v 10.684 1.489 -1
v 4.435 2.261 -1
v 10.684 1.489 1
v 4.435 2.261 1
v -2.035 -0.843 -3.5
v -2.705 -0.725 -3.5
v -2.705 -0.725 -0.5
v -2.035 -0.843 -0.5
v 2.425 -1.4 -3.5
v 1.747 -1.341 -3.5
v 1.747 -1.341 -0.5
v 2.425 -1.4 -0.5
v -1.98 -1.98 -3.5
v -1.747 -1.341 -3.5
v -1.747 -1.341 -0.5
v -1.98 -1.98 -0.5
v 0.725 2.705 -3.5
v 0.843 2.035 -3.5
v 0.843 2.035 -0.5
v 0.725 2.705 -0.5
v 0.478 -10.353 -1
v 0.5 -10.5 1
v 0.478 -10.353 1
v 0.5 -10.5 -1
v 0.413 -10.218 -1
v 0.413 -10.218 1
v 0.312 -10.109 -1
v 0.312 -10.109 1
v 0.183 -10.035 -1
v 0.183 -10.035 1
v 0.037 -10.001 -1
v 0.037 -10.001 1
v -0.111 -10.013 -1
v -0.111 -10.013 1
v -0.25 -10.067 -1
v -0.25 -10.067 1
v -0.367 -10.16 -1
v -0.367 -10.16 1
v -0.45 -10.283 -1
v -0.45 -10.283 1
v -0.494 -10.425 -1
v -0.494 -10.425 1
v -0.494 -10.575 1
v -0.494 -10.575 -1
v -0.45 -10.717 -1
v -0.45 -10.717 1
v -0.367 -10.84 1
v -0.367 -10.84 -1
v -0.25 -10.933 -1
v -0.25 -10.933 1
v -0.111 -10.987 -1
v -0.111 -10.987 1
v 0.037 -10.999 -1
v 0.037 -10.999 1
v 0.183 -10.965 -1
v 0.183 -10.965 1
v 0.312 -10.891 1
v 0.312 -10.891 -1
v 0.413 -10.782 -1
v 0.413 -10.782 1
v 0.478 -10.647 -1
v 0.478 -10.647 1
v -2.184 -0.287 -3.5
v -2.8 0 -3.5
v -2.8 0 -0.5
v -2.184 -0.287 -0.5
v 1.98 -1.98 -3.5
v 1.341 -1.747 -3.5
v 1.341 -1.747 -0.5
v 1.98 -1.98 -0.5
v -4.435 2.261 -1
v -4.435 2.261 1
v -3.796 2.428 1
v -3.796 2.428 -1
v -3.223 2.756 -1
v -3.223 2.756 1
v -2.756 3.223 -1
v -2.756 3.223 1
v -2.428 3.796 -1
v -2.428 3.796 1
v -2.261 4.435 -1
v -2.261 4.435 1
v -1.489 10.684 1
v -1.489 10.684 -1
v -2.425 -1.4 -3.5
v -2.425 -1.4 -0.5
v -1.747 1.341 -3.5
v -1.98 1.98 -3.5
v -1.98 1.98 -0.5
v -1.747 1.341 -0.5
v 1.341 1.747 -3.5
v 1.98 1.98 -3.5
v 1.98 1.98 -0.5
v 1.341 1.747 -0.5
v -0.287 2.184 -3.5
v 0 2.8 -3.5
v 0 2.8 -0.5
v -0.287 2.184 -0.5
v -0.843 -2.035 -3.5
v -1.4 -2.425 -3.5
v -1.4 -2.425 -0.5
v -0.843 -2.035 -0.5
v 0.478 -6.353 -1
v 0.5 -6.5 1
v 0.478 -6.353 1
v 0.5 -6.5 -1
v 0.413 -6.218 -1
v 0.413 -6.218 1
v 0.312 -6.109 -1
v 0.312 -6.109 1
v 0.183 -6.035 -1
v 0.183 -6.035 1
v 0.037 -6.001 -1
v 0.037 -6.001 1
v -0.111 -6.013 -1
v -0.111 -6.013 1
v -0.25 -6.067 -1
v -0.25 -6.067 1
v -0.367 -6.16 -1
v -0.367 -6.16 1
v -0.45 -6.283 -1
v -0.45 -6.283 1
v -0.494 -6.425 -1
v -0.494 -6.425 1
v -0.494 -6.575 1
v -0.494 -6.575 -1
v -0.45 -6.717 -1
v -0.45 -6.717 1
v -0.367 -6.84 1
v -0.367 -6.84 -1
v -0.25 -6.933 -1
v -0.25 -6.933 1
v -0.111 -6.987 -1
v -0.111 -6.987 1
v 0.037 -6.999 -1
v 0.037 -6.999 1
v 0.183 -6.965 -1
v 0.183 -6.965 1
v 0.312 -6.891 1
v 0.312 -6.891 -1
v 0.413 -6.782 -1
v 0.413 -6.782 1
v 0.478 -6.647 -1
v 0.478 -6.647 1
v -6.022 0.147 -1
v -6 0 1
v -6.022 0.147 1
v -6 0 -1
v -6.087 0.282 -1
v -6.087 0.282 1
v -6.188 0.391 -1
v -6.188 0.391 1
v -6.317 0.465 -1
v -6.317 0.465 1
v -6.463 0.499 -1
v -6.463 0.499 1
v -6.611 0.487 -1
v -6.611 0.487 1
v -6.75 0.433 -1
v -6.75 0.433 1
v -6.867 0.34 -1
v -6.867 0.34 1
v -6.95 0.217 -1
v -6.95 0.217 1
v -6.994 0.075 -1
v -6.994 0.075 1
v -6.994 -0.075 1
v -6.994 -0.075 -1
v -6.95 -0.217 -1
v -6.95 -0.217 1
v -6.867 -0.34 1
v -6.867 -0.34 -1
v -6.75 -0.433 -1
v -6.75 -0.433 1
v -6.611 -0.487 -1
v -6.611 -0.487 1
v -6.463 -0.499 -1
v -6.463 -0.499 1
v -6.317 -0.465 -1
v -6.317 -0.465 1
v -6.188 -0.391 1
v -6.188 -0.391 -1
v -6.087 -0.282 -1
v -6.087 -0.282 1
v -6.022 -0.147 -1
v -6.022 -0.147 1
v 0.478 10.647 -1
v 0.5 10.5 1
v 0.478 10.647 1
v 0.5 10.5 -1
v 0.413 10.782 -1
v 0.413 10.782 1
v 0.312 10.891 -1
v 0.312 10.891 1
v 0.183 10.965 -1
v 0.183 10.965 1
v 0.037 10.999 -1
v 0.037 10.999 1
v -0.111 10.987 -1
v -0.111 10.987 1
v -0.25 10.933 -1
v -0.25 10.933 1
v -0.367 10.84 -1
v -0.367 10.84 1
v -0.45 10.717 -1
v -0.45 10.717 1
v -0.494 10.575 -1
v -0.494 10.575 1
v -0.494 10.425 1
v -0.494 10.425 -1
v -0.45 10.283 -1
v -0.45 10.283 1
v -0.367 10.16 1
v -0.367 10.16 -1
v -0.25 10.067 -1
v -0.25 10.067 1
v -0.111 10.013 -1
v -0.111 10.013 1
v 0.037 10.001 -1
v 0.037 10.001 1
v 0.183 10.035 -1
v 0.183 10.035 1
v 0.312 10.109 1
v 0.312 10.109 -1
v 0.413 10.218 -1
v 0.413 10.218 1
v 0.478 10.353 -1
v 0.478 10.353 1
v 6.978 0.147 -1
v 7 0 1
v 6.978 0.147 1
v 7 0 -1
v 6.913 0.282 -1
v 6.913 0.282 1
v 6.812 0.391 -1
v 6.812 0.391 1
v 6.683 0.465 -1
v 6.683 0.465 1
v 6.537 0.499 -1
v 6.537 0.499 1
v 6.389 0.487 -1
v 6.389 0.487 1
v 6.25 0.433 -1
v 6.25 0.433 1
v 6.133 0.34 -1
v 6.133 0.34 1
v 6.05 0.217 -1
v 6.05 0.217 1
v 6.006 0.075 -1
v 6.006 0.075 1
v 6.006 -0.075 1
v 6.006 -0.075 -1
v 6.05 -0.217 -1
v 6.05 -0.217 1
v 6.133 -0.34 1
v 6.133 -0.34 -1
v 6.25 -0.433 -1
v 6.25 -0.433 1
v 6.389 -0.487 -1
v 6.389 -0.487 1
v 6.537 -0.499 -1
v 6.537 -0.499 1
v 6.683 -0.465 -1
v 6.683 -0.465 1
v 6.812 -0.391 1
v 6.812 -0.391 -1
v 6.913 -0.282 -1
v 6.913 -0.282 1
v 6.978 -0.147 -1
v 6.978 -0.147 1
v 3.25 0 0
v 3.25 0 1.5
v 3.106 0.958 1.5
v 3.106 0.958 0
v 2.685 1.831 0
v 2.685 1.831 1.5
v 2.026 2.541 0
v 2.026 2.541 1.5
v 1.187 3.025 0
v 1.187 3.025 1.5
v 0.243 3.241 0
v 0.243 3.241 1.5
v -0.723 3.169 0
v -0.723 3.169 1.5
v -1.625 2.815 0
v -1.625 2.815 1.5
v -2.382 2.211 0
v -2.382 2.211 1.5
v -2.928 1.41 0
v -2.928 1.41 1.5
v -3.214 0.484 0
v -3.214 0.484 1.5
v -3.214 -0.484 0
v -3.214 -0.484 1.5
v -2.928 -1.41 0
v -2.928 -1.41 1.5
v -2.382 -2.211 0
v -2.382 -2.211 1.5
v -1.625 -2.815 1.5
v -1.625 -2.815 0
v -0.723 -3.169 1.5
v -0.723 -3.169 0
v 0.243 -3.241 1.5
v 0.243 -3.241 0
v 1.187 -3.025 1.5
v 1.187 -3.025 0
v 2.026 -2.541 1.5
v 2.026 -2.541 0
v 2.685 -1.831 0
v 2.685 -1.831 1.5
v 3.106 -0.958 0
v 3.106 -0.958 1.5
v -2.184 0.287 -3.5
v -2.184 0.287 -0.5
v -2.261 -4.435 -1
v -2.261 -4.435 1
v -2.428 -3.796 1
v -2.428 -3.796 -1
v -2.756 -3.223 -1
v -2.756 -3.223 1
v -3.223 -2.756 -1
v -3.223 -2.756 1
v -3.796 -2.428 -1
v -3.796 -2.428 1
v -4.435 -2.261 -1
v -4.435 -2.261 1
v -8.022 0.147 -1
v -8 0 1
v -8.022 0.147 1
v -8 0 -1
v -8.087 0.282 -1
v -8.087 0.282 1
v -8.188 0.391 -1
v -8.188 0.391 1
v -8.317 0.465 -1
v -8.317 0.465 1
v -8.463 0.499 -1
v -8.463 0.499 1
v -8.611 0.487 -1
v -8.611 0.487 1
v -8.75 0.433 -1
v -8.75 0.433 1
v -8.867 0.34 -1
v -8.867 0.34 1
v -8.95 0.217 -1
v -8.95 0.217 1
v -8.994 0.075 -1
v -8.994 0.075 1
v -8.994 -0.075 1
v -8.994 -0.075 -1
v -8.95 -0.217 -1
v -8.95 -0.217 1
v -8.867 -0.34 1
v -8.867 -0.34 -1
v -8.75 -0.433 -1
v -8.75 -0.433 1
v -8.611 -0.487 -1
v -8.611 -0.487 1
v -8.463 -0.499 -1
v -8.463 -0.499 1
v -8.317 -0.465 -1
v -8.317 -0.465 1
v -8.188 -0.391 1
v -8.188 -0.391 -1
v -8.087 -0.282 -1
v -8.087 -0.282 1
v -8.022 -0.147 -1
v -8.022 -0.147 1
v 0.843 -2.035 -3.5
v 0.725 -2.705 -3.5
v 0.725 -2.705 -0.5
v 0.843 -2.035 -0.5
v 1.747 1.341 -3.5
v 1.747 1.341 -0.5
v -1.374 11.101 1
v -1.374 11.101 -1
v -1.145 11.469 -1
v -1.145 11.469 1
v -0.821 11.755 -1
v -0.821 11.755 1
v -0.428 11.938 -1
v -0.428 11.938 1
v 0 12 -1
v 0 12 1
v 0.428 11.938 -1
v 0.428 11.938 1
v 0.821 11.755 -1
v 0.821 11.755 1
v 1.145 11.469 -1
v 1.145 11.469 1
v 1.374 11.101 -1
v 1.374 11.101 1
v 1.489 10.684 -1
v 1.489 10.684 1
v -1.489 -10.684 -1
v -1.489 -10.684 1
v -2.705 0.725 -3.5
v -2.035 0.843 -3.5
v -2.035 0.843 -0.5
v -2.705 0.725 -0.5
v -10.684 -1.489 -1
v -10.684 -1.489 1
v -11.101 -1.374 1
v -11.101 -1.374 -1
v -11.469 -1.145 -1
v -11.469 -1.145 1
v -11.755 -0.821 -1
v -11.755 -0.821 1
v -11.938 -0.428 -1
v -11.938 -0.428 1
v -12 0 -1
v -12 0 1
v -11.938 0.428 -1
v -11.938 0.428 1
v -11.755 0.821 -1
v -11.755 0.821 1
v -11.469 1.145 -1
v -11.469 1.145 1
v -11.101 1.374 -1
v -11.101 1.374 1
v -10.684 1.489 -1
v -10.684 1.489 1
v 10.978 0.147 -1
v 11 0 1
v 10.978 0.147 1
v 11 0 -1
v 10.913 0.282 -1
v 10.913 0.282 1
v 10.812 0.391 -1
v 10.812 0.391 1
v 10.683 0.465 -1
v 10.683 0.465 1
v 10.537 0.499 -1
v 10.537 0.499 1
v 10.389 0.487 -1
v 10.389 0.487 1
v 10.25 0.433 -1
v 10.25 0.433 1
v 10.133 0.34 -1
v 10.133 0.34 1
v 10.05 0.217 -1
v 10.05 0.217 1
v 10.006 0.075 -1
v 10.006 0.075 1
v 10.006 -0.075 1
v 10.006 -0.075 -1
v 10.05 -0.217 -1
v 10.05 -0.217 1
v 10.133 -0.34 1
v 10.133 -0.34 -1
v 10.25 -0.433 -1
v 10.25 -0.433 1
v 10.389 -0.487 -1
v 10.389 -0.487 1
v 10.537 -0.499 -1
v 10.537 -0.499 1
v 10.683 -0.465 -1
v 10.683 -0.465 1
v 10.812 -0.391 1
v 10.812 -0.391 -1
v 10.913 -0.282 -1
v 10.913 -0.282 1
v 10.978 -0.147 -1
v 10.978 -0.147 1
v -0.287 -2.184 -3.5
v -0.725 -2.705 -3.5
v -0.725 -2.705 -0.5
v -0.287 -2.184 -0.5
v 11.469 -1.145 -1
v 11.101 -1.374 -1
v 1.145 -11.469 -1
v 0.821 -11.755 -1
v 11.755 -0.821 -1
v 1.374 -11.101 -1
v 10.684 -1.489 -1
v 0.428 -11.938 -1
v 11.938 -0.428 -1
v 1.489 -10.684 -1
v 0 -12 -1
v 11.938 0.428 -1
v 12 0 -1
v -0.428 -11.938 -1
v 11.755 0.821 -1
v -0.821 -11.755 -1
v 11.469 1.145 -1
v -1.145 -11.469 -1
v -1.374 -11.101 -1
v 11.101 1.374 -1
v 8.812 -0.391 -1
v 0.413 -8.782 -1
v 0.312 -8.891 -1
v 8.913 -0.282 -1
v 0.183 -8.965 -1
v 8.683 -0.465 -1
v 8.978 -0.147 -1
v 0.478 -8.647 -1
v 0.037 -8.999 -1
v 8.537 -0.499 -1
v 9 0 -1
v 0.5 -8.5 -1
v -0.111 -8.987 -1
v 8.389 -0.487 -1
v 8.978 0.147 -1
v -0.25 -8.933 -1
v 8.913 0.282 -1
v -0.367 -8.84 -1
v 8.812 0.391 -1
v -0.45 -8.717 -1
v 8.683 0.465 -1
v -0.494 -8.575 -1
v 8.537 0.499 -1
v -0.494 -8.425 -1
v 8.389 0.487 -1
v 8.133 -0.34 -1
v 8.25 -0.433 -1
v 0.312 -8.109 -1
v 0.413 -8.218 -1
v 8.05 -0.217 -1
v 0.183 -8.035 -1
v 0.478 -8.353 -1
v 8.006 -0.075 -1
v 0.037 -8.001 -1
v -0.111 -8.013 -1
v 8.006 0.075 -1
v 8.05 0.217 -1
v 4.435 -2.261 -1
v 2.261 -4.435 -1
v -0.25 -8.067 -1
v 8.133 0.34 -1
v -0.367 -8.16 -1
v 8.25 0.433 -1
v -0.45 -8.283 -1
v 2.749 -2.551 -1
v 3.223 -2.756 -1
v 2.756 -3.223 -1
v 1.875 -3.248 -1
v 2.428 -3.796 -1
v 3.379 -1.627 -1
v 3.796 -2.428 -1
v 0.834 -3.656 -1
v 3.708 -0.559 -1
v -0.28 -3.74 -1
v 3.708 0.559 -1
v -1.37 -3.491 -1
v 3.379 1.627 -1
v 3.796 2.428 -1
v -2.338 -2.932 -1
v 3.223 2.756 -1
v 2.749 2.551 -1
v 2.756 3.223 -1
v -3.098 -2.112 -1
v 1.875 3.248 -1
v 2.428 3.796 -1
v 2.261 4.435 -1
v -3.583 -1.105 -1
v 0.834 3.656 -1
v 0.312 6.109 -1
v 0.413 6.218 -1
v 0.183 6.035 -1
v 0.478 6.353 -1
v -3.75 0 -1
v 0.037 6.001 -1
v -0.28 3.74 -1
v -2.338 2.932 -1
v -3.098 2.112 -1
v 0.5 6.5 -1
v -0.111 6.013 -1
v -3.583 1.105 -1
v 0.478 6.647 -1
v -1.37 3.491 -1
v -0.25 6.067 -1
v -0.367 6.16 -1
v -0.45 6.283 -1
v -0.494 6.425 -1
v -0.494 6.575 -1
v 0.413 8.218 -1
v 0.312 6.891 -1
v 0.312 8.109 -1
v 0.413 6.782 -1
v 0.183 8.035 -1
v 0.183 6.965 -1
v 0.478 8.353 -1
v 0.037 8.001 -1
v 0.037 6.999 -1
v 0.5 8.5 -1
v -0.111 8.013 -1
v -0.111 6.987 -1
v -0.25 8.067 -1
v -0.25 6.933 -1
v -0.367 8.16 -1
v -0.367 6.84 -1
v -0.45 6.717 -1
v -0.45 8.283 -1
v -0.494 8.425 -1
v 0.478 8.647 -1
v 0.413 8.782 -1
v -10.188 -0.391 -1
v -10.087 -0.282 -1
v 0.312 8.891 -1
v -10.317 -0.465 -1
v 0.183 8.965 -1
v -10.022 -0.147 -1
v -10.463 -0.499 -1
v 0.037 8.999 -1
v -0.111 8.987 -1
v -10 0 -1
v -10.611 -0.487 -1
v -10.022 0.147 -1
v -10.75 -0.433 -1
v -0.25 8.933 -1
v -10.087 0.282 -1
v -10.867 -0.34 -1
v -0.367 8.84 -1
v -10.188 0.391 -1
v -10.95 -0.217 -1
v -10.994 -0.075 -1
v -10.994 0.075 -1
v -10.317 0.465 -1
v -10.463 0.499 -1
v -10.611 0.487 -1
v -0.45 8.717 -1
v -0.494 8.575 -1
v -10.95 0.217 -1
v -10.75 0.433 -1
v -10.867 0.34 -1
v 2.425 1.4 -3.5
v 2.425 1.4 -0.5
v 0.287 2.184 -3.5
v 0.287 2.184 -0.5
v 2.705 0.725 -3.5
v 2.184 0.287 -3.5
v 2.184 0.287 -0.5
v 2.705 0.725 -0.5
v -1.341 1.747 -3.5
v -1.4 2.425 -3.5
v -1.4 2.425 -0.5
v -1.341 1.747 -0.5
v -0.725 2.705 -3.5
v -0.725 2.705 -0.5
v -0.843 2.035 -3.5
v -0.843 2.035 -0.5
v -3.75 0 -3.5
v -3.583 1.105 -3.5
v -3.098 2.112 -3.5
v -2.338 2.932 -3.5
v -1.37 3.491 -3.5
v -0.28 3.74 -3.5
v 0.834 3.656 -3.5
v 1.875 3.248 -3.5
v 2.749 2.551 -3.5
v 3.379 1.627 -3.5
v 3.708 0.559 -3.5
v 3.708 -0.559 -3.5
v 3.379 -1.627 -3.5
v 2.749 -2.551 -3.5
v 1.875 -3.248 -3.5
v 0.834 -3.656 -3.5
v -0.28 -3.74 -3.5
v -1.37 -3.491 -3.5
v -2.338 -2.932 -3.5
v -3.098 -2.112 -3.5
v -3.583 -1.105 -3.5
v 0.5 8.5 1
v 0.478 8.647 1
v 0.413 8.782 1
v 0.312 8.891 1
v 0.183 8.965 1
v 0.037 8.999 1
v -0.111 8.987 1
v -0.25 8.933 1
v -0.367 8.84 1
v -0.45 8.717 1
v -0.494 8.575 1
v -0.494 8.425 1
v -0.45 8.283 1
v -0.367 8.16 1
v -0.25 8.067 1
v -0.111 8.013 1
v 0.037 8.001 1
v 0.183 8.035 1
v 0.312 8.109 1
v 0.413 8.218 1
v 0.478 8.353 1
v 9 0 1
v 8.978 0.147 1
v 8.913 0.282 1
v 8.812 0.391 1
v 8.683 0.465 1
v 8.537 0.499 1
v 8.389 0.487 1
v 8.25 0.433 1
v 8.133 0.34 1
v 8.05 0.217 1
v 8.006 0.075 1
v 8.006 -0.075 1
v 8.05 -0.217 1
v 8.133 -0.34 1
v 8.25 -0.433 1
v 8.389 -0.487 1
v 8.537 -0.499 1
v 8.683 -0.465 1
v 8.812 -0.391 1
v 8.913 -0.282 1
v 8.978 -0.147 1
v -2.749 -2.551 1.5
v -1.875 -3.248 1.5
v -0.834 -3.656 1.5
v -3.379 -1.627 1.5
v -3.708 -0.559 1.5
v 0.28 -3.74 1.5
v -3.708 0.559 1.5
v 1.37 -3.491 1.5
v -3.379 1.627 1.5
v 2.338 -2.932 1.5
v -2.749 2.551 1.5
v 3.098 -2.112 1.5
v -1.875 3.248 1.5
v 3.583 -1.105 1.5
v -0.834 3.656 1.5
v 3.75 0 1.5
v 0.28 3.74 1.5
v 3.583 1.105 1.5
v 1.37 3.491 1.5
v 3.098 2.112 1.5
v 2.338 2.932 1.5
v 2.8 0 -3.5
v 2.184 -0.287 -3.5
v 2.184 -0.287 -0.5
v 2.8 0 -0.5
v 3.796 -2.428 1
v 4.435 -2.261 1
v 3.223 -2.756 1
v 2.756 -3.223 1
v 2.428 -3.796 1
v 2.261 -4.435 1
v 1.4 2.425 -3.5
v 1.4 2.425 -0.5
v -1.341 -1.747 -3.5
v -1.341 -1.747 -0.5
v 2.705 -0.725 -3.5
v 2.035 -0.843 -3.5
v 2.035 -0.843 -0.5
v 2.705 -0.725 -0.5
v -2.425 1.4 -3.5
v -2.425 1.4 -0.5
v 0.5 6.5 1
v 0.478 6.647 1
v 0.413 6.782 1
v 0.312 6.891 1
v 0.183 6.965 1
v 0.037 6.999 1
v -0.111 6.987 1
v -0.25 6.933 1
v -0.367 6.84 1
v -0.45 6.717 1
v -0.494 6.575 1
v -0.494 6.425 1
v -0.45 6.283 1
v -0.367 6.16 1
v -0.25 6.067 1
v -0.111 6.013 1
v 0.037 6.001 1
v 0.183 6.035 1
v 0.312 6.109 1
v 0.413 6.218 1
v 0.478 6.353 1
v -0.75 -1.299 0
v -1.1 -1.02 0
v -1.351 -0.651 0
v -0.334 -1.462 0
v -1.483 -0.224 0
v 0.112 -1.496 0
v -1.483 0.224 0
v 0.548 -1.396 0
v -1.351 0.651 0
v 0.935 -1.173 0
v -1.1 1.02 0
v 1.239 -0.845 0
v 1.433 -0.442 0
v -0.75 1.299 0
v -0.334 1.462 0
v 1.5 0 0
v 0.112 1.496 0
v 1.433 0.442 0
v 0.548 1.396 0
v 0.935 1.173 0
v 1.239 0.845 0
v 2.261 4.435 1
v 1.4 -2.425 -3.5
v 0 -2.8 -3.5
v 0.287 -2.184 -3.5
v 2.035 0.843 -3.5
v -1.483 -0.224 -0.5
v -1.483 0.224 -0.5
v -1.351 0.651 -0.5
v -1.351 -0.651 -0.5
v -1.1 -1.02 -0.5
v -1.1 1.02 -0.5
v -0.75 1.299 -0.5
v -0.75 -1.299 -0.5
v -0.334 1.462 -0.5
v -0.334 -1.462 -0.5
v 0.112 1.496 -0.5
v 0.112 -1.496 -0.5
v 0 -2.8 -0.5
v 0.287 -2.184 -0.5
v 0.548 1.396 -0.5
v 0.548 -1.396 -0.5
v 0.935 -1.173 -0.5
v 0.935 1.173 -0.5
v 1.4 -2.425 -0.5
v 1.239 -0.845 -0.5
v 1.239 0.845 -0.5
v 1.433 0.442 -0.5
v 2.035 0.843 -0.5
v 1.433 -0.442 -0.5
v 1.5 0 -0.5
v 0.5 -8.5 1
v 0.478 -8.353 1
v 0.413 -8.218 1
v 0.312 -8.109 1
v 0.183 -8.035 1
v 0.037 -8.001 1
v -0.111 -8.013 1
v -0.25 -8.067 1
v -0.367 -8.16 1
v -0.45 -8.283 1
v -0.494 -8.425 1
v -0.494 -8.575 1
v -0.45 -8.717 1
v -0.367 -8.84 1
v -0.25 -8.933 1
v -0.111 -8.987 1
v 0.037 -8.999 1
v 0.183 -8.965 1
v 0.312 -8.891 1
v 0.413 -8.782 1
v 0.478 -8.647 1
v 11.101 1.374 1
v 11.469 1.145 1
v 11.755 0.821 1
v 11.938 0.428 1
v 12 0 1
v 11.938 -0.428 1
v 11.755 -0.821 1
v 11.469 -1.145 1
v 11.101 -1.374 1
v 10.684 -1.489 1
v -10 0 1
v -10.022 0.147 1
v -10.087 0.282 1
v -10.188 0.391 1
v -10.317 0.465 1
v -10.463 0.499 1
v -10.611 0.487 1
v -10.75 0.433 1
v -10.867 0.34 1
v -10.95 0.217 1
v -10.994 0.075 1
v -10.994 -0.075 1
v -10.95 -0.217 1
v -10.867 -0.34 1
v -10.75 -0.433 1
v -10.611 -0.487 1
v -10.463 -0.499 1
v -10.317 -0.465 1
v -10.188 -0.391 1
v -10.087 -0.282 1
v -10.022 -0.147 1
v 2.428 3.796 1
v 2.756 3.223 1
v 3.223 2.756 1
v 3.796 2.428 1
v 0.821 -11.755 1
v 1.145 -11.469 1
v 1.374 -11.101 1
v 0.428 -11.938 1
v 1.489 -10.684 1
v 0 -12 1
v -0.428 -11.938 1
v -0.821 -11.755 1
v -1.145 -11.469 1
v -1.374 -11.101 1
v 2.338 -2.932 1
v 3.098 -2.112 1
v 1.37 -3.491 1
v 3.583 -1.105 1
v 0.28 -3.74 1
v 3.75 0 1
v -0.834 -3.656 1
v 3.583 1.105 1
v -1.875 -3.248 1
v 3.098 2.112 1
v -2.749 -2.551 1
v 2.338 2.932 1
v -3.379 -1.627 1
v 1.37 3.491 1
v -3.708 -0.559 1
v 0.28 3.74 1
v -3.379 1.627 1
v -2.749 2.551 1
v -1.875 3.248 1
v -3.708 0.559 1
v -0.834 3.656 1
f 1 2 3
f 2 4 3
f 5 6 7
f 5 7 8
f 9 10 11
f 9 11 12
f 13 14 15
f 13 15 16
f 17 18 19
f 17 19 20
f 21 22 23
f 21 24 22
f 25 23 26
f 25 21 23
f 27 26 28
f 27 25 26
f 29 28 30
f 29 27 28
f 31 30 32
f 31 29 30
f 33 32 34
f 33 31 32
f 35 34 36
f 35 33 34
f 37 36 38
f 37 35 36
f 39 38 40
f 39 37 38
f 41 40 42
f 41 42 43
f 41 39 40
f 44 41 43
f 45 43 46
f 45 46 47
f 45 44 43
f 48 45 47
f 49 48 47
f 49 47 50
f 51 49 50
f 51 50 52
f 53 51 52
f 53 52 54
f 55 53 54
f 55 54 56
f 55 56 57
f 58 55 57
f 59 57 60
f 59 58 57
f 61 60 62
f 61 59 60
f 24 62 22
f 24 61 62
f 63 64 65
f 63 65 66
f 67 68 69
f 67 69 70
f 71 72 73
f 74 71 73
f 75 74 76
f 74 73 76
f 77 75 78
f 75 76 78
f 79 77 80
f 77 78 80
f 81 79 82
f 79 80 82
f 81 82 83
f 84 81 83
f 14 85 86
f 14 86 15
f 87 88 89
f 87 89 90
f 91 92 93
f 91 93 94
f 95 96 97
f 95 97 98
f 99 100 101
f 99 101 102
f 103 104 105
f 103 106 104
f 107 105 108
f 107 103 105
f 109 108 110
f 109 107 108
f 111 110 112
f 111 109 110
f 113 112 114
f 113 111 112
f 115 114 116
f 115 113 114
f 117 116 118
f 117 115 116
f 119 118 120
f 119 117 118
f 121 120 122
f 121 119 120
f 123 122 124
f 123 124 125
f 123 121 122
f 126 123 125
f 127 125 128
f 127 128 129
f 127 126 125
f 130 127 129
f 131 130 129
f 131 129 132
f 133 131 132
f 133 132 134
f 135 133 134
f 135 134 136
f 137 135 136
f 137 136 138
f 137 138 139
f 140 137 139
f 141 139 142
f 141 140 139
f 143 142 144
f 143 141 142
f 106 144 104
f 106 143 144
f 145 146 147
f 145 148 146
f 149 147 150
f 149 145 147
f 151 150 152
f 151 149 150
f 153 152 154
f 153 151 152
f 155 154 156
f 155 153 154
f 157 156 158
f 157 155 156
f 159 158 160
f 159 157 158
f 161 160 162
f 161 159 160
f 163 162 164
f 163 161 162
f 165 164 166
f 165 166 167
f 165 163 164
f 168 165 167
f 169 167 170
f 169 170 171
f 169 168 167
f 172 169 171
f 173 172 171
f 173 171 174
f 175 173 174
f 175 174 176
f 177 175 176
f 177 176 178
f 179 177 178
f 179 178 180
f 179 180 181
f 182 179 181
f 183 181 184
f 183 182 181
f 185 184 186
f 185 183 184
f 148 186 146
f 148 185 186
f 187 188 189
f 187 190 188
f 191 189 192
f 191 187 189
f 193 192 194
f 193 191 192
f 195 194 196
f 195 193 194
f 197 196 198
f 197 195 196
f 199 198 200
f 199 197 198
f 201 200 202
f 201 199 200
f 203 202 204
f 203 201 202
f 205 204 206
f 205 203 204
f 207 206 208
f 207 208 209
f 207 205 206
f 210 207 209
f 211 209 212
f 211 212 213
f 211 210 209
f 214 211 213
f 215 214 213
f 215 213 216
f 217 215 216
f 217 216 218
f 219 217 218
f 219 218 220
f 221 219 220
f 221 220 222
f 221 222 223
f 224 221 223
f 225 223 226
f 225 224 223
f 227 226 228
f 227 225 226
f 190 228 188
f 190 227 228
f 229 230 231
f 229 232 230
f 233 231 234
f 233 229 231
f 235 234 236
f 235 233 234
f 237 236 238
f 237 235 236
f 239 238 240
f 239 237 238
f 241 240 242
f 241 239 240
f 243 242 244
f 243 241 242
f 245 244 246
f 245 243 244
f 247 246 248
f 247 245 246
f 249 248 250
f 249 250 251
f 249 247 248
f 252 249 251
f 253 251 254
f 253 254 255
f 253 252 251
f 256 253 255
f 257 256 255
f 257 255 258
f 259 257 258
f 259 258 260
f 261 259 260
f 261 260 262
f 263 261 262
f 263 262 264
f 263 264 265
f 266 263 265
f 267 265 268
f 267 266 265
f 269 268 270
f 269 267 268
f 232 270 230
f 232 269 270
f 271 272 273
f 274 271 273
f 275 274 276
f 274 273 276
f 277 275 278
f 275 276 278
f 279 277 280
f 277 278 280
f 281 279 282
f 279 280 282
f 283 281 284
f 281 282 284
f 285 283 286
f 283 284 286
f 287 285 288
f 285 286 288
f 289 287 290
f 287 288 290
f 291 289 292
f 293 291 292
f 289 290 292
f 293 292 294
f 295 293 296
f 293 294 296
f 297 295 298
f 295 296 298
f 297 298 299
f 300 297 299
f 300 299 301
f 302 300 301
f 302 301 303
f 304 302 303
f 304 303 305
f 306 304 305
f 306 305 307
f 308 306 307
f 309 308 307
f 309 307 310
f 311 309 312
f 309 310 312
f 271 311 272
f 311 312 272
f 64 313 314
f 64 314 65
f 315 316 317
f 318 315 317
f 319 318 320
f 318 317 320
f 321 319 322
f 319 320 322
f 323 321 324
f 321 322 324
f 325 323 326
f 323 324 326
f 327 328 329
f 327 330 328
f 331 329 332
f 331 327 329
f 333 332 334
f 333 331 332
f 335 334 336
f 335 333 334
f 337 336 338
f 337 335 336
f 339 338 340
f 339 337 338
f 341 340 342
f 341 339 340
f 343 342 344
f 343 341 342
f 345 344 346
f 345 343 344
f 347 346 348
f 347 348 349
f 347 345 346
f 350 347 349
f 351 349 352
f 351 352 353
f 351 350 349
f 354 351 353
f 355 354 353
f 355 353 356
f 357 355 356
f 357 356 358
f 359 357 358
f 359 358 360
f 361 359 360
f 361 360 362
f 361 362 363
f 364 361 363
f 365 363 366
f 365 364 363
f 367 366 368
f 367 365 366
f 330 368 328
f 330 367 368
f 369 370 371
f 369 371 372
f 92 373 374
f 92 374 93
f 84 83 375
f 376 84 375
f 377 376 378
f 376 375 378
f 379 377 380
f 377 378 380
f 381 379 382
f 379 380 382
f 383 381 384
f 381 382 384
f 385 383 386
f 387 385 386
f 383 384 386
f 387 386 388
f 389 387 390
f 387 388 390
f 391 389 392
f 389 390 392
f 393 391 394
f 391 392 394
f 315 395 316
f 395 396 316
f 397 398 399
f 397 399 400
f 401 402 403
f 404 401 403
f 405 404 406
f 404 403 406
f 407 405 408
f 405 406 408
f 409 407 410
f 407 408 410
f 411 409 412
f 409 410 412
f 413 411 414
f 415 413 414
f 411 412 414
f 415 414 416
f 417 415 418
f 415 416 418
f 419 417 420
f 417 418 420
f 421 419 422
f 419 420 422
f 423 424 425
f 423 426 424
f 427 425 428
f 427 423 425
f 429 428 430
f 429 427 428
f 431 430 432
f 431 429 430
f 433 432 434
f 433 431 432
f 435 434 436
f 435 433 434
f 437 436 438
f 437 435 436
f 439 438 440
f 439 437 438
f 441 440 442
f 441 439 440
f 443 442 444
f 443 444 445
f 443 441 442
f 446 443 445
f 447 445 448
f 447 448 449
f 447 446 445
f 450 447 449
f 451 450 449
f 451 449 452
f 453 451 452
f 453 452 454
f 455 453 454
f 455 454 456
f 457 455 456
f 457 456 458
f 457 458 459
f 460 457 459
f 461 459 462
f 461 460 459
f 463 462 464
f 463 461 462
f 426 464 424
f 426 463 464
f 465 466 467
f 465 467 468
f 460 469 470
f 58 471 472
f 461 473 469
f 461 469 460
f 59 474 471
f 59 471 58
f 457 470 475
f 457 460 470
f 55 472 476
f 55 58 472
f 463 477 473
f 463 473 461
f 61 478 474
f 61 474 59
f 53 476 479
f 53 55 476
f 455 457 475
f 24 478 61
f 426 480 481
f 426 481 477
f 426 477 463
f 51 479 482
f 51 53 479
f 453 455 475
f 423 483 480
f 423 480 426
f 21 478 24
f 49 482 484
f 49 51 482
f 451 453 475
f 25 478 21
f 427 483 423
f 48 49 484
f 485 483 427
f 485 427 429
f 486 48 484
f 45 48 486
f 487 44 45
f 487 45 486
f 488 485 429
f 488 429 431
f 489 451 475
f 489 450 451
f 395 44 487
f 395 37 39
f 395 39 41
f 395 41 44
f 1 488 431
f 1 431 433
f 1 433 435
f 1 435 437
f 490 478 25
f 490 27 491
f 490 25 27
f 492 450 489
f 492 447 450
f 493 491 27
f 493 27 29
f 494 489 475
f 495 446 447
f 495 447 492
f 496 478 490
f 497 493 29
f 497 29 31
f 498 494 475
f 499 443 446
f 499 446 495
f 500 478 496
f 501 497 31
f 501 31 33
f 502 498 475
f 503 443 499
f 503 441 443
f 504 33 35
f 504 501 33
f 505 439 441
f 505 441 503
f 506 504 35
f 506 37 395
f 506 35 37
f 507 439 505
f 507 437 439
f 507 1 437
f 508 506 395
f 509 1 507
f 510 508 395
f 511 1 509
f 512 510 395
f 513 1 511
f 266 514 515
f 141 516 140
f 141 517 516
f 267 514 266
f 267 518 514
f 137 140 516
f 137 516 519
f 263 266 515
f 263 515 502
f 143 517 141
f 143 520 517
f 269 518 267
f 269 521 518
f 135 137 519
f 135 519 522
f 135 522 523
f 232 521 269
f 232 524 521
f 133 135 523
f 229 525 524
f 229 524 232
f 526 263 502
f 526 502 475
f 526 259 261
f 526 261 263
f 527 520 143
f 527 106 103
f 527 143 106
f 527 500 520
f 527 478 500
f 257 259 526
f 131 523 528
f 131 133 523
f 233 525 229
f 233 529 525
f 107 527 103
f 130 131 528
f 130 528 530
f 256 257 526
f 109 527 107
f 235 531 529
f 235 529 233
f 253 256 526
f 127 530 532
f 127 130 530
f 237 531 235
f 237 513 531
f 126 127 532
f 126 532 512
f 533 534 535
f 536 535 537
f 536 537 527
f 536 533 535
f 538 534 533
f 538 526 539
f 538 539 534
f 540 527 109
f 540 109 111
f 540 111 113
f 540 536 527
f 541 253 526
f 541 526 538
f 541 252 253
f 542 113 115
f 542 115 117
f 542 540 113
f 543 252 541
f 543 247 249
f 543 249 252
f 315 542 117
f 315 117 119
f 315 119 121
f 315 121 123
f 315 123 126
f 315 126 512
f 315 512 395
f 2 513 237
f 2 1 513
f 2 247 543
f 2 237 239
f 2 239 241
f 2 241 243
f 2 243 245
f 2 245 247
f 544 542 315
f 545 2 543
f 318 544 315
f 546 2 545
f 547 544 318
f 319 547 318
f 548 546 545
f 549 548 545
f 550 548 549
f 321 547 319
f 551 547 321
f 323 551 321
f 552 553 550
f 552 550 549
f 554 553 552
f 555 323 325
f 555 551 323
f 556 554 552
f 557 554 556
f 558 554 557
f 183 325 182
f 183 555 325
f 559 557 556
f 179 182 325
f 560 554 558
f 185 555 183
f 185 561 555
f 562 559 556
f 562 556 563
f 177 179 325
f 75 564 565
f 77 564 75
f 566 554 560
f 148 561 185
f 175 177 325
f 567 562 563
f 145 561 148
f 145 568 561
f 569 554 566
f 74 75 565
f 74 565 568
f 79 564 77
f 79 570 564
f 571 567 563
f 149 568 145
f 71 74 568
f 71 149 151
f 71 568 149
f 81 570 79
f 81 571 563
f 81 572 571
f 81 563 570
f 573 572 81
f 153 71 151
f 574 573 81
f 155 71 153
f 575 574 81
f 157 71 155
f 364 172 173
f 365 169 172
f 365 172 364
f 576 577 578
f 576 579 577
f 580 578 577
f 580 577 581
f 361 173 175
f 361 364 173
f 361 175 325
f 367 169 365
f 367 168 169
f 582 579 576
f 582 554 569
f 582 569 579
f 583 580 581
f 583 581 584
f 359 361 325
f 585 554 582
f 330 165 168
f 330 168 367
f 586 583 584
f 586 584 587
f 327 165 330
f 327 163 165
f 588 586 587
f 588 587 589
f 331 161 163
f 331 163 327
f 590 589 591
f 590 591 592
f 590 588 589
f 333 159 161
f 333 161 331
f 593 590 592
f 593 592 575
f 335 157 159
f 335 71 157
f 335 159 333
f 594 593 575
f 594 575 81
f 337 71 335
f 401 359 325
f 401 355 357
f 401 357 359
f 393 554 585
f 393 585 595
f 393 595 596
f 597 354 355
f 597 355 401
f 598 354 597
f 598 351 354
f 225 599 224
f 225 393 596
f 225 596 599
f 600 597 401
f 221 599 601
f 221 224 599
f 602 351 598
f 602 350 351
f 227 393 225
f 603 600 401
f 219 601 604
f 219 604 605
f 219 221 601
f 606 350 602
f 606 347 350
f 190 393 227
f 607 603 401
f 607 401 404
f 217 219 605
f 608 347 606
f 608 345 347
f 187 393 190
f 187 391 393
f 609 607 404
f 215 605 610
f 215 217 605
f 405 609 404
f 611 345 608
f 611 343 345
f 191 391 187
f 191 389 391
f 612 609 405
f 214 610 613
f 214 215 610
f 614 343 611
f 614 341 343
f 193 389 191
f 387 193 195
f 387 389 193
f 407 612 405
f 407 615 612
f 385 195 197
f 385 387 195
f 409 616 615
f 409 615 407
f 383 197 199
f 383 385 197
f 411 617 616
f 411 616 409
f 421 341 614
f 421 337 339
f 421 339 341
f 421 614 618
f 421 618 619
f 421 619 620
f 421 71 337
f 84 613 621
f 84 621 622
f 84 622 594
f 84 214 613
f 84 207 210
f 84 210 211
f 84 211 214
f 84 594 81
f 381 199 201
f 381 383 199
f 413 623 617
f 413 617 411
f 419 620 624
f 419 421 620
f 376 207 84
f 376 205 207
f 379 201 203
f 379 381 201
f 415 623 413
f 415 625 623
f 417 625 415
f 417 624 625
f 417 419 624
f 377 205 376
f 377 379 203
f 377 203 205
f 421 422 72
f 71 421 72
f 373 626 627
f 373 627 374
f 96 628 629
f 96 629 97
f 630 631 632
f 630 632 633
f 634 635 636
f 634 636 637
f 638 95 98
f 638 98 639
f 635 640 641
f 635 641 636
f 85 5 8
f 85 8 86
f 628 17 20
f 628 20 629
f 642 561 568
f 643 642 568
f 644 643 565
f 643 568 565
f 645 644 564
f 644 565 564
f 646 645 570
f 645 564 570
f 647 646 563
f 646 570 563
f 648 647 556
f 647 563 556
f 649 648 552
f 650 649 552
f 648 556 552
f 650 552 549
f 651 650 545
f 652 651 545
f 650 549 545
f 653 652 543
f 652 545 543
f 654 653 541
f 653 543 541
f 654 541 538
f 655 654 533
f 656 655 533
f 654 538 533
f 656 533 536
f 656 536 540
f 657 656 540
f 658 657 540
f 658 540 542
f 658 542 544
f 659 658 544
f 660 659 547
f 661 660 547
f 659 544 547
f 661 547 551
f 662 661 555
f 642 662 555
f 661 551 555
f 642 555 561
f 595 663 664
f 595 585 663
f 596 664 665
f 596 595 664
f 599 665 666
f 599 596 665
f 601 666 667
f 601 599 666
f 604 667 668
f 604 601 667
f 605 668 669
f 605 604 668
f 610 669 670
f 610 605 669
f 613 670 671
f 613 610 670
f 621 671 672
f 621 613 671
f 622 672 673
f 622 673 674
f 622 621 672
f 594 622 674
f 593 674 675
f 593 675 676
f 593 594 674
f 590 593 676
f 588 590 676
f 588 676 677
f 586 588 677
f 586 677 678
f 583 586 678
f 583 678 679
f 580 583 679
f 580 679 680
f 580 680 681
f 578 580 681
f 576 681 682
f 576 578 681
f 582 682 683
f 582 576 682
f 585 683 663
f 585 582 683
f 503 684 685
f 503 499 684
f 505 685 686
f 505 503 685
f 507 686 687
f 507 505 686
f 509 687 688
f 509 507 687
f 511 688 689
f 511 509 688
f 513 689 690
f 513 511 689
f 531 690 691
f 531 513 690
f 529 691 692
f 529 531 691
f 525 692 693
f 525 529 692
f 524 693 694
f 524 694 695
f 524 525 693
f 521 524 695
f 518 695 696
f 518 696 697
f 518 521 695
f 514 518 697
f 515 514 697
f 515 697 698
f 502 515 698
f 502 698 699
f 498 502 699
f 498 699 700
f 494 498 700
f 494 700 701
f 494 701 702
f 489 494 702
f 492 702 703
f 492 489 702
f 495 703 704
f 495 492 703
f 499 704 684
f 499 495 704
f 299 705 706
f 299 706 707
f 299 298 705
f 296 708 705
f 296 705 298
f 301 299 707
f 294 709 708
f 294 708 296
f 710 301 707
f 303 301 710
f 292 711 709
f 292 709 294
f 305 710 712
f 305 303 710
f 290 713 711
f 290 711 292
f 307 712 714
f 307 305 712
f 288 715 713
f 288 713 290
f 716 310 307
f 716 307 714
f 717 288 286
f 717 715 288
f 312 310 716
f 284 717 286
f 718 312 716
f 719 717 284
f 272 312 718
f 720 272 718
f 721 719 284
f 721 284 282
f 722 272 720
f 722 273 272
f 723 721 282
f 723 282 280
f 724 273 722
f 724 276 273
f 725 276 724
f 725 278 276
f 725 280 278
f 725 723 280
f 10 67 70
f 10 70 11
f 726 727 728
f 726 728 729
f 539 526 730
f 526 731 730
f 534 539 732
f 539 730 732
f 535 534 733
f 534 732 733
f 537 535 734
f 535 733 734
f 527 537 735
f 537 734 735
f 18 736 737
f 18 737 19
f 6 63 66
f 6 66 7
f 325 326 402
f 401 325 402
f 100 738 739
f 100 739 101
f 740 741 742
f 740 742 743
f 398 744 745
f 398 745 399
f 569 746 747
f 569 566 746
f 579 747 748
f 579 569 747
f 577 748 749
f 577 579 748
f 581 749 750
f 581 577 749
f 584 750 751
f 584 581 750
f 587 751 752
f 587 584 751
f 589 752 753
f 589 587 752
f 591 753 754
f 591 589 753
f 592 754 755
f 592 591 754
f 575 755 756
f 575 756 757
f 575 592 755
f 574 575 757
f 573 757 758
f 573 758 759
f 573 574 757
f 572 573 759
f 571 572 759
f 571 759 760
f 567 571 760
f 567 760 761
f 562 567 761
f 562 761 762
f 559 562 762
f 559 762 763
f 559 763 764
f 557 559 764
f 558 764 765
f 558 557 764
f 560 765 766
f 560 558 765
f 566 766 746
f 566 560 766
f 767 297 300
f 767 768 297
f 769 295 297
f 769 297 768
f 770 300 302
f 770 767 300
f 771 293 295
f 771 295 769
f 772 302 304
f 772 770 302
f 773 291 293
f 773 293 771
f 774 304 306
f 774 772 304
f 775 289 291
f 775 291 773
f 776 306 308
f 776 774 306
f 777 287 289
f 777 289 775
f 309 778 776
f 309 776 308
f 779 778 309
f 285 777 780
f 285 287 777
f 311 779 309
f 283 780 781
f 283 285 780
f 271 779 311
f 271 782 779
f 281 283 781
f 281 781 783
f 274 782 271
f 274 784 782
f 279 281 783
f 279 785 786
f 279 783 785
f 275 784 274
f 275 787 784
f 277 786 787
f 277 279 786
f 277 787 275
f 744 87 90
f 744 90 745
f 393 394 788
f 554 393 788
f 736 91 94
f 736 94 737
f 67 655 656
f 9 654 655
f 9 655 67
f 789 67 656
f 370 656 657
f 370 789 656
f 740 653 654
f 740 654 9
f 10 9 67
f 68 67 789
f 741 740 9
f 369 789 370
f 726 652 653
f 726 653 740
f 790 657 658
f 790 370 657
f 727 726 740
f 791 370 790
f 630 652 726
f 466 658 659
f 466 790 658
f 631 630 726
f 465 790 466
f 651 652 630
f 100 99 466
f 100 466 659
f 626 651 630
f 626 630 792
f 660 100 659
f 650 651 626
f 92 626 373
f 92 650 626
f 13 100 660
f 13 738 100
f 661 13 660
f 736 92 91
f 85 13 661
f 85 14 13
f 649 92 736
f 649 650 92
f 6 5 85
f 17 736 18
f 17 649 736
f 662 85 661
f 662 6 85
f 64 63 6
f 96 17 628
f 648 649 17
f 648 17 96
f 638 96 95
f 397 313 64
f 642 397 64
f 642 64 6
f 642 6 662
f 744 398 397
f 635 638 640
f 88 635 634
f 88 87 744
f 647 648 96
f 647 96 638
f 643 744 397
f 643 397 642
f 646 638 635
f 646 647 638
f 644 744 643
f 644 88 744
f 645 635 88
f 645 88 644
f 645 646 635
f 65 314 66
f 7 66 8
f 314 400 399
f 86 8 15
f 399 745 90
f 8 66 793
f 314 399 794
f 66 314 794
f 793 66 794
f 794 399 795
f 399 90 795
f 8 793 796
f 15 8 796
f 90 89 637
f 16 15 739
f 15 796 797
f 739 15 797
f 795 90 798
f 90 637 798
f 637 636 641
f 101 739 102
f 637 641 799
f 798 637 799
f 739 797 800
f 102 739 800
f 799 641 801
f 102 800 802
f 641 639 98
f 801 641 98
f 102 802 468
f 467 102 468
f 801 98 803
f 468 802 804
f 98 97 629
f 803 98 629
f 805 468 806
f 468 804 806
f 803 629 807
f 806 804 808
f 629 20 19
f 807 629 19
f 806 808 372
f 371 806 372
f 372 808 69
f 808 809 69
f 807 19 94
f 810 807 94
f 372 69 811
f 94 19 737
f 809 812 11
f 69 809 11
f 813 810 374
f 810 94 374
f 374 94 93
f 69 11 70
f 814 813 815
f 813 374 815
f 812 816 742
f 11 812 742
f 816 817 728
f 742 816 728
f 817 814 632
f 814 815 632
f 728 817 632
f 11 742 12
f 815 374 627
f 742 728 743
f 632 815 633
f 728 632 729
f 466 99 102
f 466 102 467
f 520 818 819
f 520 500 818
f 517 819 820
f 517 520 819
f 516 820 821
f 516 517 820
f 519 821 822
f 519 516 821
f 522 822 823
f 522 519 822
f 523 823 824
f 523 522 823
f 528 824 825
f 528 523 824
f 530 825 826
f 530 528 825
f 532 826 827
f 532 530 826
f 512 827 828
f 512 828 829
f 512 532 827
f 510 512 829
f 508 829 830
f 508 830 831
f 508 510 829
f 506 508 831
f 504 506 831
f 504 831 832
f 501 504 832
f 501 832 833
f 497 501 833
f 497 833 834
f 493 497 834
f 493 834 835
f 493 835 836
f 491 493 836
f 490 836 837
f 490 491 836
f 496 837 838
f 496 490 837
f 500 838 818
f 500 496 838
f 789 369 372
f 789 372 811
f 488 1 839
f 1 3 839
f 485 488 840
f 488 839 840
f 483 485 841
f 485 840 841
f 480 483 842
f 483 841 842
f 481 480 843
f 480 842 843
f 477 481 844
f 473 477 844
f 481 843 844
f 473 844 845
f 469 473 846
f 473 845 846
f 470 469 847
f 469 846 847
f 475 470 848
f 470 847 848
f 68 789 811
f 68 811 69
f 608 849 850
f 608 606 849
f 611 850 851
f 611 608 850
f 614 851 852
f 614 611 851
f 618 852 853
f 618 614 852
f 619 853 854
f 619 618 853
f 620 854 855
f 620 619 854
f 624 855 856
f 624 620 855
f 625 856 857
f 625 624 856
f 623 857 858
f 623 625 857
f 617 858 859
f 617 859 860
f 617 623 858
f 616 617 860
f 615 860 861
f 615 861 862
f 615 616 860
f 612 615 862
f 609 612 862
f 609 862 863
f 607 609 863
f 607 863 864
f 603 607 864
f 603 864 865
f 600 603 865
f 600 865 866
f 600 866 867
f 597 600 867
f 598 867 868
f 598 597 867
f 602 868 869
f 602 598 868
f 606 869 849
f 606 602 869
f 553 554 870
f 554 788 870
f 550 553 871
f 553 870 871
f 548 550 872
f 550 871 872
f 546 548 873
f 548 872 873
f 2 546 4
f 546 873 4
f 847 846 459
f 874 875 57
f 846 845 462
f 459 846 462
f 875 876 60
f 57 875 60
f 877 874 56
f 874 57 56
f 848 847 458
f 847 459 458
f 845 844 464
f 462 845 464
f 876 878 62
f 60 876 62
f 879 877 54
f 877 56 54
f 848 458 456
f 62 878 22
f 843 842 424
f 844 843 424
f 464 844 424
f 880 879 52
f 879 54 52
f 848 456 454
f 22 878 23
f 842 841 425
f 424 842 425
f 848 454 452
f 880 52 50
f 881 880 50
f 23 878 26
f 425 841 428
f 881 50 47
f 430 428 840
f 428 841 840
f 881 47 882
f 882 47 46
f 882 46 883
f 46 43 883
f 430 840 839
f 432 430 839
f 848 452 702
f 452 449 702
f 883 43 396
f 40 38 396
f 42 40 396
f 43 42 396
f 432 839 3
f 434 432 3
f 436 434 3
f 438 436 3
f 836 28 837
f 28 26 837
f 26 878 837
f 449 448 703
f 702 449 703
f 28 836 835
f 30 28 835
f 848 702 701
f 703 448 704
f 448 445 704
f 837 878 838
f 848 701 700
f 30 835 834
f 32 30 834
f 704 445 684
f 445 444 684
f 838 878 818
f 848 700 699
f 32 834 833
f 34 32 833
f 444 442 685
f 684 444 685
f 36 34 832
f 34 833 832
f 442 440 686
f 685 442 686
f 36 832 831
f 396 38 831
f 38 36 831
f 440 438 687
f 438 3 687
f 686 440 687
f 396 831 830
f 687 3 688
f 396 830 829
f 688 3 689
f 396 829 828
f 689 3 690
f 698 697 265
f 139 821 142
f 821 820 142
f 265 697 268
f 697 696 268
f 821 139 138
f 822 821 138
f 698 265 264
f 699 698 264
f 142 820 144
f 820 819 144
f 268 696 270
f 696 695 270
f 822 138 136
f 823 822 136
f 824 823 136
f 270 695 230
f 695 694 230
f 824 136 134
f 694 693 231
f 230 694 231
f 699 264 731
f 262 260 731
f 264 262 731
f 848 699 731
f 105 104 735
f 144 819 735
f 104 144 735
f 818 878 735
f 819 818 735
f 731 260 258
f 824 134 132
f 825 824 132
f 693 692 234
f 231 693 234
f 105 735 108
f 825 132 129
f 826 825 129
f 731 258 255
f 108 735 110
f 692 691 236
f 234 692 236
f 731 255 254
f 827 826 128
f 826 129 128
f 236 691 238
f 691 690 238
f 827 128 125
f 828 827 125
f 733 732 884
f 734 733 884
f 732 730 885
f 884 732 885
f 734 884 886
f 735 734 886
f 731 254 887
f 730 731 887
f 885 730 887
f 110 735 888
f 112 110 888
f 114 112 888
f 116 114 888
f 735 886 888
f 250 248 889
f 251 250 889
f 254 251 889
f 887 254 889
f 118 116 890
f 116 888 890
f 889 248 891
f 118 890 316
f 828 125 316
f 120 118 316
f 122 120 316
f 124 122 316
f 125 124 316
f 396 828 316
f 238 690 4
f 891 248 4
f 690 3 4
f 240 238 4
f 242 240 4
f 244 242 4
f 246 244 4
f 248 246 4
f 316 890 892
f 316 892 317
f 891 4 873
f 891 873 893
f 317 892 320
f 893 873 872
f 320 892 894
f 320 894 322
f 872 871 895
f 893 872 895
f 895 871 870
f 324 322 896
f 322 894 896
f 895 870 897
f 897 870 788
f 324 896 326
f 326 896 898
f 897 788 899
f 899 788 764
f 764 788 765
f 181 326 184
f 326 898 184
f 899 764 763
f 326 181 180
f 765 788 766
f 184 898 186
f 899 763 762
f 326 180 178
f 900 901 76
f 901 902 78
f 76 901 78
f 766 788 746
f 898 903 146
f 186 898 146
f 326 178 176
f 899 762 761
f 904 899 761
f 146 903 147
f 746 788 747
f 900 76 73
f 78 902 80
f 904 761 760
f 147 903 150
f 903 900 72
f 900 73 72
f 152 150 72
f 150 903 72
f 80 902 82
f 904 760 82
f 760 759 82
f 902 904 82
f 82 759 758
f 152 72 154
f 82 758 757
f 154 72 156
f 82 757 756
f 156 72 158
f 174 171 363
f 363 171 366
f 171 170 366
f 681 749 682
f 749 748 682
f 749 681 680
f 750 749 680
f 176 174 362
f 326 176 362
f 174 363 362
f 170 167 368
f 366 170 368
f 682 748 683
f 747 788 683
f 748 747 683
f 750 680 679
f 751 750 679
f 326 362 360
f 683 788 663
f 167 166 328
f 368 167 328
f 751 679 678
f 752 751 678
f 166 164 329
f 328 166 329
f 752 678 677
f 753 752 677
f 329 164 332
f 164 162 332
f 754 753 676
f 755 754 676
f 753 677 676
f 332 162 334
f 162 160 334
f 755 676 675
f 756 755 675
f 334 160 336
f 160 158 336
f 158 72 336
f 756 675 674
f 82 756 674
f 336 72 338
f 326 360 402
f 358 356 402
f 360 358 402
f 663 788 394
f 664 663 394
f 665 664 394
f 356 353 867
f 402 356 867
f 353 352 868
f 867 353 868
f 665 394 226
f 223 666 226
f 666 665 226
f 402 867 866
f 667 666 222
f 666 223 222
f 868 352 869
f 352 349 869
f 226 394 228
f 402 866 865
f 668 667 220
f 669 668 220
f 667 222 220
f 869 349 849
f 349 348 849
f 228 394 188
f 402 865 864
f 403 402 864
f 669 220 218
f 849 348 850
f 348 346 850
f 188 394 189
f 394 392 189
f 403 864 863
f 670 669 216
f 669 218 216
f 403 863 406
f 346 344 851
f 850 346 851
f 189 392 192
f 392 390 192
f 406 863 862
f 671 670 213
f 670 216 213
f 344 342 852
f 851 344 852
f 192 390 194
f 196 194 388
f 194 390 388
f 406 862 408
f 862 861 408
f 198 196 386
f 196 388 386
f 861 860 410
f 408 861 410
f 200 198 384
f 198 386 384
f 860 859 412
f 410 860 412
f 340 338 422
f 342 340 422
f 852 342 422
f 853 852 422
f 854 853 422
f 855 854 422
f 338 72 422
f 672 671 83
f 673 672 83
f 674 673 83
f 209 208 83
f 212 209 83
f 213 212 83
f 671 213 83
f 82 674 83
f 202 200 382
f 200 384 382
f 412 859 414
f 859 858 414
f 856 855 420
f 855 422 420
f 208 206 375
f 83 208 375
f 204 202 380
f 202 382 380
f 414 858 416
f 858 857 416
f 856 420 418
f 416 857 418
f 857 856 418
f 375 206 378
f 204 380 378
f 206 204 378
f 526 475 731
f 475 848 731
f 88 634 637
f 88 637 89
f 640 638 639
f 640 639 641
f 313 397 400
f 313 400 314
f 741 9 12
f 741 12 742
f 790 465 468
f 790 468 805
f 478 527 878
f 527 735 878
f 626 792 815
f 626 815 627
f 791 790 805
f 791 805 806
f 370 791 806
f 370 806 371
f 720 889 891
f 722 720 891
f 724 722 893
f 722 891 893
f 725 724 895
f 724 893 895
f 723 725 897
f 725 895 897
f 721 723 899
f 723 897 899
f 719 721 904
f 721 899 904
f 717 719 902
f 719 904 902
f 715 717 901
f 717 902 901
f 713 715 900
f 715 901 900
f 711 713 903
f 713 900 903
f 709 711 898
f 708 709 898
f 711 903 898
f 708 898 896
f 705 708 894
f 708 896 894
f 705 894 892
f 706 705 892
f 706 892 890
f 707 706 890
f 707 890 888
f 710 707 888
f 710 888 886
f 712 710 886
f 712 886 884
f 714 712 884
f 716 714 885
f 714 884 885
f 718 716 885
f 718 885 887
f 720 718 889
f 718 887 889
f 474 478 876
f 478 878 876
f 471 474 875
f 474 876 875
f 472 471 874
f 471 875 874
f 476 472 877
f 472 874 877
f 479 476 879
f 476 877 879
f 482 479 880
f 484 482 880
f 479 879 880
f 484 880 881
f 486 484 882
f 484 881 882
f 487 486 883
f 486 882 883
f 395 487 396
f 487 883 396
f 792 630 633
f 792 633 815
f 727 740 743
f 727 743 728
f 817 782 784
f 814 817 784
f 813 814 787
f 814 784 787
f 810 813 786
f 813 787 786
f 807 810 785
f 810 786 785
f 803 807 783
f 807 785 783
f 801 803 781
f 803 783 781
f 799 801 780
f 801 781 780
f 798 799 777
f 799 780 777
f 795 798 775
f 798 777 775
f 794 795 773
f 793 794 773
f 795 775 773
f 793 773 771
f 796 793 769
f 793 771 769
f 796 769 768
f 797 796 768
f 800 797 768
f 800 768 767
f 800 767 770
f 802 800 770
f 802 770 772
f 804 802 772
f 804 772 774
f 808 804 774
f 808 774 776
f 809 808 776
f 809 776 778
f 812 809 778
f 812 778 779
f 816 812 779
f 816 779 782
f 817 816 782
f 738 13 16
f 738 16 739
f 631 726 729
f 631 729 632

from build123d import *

# Parameters (mm, degrees)
ESQUISSE1_R                  = 0.5
BASE_EXTRUSION_DEPTH         = 1
ESQUISSE2_R                  = 3.75
BOSS_EXTRU_1_DEPTH           = 0.5
ESQUISSE3_R                  = 3.75
BOSS_EXTRU_2_DEPTH           = 2.5
ESQUISSE4_R                  = 3.25
ENL_V_MAT_EXTRU_1_DEPTH      = 1.5
ESQUISSE5_R                  = 1.5
ENL_V_MAT_EXTRU_2_DEPTH      = 4.5
ESQUISSE7_R                  = 2.2
ENL_V_MAT_EXTRU_4_DEPTH      = 3
DENTS_DEPTH                  = 3
R_P_TITION_CIRCULAIRE1_COUNT = 24


with BuildPart() as part:
    # Esquisse1 → Base-Extrusion (new body, symmetric)
    with BuildSketch(Plane.XY):
        with BuildLine():
            Line((1.488676655, 10.683961455), (2.260839574, 4.435364907))
            ThreePointArc((2.260839574, 4.435364907), (2.974200379, 2.974200379), (4.435364907, 2.260839574))
            Line((4.435364907, 2.260839574), (10.683961455, 1.488676655))
            ThreePointArc((10.683961455, 1.488676655), (12, 0), (10.683961455, -1.488676655))
            Line((10.683961455, -1.488676655), (4.435364907, -2.260839574))
            ThreePointArc((4.435364907, -2.260839574), (2.974200379, -2.974200379), (2.260839574, -4.435364907))
            Line((2.260839574, -4.435364907), (1.488676655, -10.683961455))
            ThreePointArc((1.488676655, -10.683961455), (0, -12), (-1.488676655, -10.683961455))
            Line((-1.488676655, -10.683961455), (-2.260839574, -4.435364907))
            ThreePointArc((-2.260839574, -4.435364907), (-2.974200379, -2.974200379), (-4.435364907, -2.260839574))
            Line((-4.435364907, -2.260839574), (-10.683961455, -1.488676655))
            ThreePointArc((-10.683961455, -1.488676655), (-12, 0), (-10.683961455, 1.488676655))
            Line((-10.683961455, 1.488676655), (-4.435364907, 2.260839574))
            ThreePointArc((-4.435364907, 2.260839574), (-2.974200379, 2.974200379), (-2.260839574, 4.435364907))
            Line((-2.260839574, 4.435364907), (-1.488676655, 10.683961455))
            ThreePointArc((-1.488676655, 10.683961455), (0, 12), (1.488676655, 10.683961455))
        make_face()
        with Locations((10.5, 0)):
            Circle(ESQUISSE1_R, mode=Mode.SUBTRACT)
        with Locations((8.5, 0)):
            Circle(ESQUISSE1_R, mode=Mode.SUBTRACT)
        with Locations((6.5, 0)):
            Circle(ESQUISSE1_R, mode=Mode.SUBTRACT)
        with Locations((0, -10.5)):
            Circle(ESQUISSE1_R, mode=Mode.SUBTRACT)
        with Locations((0, -8.5)):
            Circle(ESQUISSE1_R, mode=Mode.SUBTRACT)
        with Locations((0, -6.5)):
            Circle(ESQUISSE1_R, mode=Mode.SUBTRACT)
        with Locations((0, 10.5)):
            Circle(ESQUISSE1_R, mode=Mode.SUBTRACT)
        with Locations((0, 8.5)):
            Circle(ESQUISSE1_R, mode=Mode.SUBTRACT)
        with Locations((0, 6.5)):
            Circle(ESQUISSE1_R, mode=Mode.SUBTRACT)
        with Locations((-10.5, 0)):
            Circle(ESQUISSE1_R, mode=Mode.SUBTRACT)
        with Locations((-8.5, 0)):
            Circle(ESQUISSE1_R, mode=Mode.SUBTRACT)
        with Locations((-6.5, 0)):
            Circle(ESQUISSE1_R, mode=Mode.SUBTRACT)
    extrude(amount=BASE_EXTRUSION_DEPTH, both=True)

    # Esquisse2 → Boss.-Extru.1 (add)
    with BuildSketch(Plane.XY.offset(1)):
        Circle(ESQUISSE2_R)
    extrude(amount=BOSS_EXTRU_1_DEPTH)

    # Esquisse3 → Boss.-Extru.2 (add)
    with BuildSketch(Plane(origin=(0, 0, -1), x_dir=(-1, 0, 0), z_dir=(0, 0, -1))):
        Circle(ESQUISSE3_R)
    extrude(amount=BOSS_EXTRU_2_DEPTH)

    # Esquisse4 → Enlèv. mat.-Extru.1 (cut)
    with BuildSketch(Plane.XY.offset(1.5)):
        Circle(ESQUISSE4_R)
    extrude(amount=-ENL_V_MAT_EXTRU_1_DEPTH, mode=Mode.SUBTRACT)

    # Esquisse5 → Enlèv. mat.-Extru.2 (cut, through all)
    with BuildSketch(Plane.XY):
        Circle(ESQUISSE5_R)
    extrude(amount=-ENL_V_MAT_EXTRU_2_DEPTH, mode=Mode.SUBTRACT)

    # Esquisse7 → Enlèv. mat.-Extru.4 (cut)
    with BuildSketch(Plane(origin=(0, 0, -3.5), x_dir=(-1, 0, 0), z_dir=(0, 0, -1))):
        Circle(ESQUISSE7_R)
    extrude(amount=-ENL_V_MAT_EXTRU_4_DEPTH, mode=Mode.SUBTRACT)

    # Esquisse6 → Dents (cut)
    with BuildSketch(Plane(origin=(0, 0, -3.5), x_dir=(-1, 0, 0), z_dir=(0, 0, -1))):
        with BuildLine():
            Line((0, 2.8), (0.288653169, 2.180981281))
            ThreePointArc((0.288653169, 2.180981281), (0, 2.2), (-0.288653169, 2.180981281))
            Line((-0.288653169, 2.180981281), (0, 2.8))
        make_face()
    dents = extrude(amount=-DENTS_DEPTH, mode=Mode.SUBTRACT)

    # Répétition circulaire1: Dents ×24 about axis
    r_p_tition_circulaire1_axis = Axis((0, 0, 0), (0, 0, 1))
    for i in range(1, R_P_TITION_CIRCULAIRE1_COUNT):
        add(dents.rotate(r_p_tition_circulaire1_axis, i * 360 / R_P_TITION_CIRCULAIRE1_COUNT), mode=Mode.SUBTRACT)


solid = part.part
